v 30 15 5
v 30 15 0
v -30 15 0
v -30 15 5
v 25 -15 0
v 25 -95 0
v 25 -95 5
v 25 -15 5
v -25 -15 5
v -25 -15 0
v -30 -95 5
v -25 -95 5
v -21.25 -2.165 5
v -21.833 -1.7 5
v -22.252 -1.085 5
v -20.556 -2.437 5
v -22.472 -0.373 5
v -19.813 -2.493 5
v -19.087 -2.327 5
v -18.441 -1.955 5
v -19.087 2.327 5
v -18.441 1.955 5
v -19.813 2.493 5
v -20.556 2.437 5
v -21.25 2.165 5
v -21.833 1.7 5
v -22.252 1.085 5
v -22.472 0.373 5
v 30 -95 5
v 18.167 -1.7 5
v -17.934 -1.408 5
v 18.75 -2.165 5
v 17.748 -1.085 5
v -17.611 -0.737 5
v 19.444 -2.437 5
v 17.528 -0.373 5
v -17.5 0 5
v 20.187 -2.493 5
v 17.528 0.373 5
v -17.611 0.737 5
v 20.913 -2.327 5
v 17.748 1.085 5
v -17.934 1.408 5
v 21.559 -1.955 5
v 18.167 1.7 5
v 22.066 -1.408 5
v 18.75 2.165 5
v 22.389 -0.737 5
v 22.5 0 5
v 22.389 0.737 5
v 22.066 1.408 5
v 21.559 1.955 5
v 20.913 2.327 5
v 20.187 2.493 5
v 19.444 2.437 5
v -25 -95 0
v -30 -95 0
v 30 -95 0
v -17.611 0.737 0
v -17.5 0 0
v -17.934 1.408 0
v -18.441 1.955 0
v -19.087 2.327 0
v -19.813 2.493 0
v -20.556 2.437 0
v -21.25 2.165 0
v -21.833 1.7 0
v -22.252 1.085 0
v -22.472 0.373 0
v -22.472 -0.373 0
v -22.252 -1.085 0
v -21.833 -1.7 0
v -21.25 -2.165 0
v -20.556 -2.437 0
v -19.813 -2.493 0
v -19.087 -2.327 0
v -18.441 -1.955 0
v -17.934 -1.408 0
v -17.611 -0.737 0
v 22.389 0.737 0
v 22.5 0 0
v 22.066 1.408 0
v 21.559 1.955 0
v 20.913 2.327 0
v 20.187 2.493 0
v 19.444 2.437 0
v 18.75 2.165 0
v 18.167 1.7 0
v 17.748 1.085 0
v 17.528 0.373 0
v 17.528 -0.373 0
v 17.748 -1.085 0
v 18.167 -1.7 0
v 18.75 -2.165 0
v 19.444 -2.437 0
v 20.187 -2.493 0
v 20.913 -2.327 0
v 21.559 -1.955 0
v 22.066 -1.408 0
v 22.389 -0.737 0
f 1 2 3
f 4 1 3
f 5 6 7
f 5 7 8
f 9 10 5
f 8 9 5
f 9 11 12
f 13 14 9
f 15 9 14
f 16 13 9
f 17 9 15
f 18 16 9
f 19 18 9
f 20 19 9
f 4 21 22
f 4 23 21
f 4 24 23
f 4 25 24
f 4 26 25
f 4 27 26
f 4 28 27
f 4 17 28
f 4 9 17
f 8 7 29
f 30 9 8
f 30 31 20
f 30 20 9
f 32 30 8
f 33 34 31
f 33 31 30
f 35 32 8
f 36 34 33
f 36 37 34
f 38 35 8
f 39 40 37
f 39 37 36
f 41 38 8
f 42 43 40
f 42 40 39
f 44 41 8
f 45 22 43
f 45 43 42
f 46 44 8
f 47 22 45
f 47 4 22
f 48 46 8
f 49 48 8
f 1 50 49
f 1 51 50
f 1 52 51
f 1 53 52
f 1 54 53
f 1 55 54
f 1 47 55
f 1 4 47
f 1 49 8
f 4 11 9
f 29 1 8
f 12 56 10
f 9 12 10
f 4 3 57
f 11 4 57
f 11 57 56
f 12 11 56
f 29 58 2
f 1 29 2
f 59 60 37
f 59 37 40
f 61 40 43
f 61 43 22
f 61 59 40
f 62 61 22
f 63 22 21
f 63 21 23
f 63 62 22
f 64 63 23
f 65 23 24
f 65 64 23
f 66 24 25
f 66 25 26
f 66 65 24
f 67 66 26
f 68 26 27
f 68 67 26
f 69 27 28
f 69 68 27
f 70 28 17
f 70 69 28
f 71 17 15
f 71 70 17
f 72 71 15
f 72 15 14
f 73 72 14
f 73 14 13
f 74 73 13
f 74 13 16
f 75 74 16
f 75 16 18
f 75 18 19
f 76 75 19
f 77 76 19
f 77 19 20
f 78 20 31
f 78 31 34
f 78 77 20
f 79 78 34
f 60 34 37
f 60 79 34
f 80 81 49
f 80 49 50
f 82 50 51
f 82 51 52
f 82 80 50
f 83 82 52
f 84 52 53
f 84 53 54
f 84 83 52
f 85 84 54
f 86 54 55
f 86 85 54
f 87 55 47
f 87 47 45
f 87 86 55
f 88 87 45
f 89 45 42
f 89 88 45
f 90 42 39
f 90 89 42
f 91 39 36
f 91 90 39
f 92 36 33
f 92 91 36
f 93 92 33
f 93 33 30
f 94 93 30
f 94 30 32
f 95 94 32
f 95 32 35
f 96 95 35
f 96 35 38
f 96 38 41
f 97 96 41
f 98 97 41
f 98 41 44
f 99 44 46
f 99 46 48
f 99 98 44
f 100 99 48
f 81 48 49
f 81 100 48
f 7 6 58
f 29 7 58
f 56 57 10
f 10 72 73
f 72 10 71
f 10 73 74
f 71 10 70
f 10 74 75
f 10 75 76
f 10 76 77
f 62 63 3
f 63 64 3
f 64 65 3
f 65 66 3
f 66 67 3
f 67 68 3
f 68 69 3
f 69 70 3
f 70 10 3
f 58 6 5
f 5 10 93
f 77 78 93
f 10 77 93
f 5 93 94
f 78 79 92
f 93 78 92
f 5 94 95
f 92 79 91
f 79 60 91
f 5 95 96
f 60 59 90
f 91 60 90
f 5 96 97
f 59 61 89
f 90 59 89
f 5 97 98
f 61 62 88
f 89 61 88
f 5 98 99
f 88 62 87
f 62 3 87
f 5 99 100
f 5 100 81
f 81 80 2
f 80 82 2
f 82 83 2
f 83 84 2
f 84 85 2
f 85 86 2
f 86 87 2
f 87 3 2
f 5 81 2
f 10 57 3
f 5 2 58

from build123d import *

# Parameters (mm, degrees)
F0_R     = 2.5
F0_W     = 5
F0_H     = 80
F1_DEPTH = 5


with BuildPart() as f1:
    # F0 (on Top) → F1 (new body)
    with BuildSketch(Plane.XY):
        Polygon((30, -15), (30, 15), (-30, 15), (-30, -15), (-25, -15), (25, -15), align=None)
        with Locations((-20, 0)):
            Circle(F0_R, mode=Mode.SUBTRACT)
        with Locations((20, 0)):
            Circle(F0_R, mode=Mode.SUBTRACT)
        with Locations((27.5, -55)):
            Rectangle(F0_W, F0_H)
        with Locations((-27.5, -55)):
            Rectangle(F0_W, F0_H)
    extrude(amount=F1_DEPTH)


solid = f1.part
